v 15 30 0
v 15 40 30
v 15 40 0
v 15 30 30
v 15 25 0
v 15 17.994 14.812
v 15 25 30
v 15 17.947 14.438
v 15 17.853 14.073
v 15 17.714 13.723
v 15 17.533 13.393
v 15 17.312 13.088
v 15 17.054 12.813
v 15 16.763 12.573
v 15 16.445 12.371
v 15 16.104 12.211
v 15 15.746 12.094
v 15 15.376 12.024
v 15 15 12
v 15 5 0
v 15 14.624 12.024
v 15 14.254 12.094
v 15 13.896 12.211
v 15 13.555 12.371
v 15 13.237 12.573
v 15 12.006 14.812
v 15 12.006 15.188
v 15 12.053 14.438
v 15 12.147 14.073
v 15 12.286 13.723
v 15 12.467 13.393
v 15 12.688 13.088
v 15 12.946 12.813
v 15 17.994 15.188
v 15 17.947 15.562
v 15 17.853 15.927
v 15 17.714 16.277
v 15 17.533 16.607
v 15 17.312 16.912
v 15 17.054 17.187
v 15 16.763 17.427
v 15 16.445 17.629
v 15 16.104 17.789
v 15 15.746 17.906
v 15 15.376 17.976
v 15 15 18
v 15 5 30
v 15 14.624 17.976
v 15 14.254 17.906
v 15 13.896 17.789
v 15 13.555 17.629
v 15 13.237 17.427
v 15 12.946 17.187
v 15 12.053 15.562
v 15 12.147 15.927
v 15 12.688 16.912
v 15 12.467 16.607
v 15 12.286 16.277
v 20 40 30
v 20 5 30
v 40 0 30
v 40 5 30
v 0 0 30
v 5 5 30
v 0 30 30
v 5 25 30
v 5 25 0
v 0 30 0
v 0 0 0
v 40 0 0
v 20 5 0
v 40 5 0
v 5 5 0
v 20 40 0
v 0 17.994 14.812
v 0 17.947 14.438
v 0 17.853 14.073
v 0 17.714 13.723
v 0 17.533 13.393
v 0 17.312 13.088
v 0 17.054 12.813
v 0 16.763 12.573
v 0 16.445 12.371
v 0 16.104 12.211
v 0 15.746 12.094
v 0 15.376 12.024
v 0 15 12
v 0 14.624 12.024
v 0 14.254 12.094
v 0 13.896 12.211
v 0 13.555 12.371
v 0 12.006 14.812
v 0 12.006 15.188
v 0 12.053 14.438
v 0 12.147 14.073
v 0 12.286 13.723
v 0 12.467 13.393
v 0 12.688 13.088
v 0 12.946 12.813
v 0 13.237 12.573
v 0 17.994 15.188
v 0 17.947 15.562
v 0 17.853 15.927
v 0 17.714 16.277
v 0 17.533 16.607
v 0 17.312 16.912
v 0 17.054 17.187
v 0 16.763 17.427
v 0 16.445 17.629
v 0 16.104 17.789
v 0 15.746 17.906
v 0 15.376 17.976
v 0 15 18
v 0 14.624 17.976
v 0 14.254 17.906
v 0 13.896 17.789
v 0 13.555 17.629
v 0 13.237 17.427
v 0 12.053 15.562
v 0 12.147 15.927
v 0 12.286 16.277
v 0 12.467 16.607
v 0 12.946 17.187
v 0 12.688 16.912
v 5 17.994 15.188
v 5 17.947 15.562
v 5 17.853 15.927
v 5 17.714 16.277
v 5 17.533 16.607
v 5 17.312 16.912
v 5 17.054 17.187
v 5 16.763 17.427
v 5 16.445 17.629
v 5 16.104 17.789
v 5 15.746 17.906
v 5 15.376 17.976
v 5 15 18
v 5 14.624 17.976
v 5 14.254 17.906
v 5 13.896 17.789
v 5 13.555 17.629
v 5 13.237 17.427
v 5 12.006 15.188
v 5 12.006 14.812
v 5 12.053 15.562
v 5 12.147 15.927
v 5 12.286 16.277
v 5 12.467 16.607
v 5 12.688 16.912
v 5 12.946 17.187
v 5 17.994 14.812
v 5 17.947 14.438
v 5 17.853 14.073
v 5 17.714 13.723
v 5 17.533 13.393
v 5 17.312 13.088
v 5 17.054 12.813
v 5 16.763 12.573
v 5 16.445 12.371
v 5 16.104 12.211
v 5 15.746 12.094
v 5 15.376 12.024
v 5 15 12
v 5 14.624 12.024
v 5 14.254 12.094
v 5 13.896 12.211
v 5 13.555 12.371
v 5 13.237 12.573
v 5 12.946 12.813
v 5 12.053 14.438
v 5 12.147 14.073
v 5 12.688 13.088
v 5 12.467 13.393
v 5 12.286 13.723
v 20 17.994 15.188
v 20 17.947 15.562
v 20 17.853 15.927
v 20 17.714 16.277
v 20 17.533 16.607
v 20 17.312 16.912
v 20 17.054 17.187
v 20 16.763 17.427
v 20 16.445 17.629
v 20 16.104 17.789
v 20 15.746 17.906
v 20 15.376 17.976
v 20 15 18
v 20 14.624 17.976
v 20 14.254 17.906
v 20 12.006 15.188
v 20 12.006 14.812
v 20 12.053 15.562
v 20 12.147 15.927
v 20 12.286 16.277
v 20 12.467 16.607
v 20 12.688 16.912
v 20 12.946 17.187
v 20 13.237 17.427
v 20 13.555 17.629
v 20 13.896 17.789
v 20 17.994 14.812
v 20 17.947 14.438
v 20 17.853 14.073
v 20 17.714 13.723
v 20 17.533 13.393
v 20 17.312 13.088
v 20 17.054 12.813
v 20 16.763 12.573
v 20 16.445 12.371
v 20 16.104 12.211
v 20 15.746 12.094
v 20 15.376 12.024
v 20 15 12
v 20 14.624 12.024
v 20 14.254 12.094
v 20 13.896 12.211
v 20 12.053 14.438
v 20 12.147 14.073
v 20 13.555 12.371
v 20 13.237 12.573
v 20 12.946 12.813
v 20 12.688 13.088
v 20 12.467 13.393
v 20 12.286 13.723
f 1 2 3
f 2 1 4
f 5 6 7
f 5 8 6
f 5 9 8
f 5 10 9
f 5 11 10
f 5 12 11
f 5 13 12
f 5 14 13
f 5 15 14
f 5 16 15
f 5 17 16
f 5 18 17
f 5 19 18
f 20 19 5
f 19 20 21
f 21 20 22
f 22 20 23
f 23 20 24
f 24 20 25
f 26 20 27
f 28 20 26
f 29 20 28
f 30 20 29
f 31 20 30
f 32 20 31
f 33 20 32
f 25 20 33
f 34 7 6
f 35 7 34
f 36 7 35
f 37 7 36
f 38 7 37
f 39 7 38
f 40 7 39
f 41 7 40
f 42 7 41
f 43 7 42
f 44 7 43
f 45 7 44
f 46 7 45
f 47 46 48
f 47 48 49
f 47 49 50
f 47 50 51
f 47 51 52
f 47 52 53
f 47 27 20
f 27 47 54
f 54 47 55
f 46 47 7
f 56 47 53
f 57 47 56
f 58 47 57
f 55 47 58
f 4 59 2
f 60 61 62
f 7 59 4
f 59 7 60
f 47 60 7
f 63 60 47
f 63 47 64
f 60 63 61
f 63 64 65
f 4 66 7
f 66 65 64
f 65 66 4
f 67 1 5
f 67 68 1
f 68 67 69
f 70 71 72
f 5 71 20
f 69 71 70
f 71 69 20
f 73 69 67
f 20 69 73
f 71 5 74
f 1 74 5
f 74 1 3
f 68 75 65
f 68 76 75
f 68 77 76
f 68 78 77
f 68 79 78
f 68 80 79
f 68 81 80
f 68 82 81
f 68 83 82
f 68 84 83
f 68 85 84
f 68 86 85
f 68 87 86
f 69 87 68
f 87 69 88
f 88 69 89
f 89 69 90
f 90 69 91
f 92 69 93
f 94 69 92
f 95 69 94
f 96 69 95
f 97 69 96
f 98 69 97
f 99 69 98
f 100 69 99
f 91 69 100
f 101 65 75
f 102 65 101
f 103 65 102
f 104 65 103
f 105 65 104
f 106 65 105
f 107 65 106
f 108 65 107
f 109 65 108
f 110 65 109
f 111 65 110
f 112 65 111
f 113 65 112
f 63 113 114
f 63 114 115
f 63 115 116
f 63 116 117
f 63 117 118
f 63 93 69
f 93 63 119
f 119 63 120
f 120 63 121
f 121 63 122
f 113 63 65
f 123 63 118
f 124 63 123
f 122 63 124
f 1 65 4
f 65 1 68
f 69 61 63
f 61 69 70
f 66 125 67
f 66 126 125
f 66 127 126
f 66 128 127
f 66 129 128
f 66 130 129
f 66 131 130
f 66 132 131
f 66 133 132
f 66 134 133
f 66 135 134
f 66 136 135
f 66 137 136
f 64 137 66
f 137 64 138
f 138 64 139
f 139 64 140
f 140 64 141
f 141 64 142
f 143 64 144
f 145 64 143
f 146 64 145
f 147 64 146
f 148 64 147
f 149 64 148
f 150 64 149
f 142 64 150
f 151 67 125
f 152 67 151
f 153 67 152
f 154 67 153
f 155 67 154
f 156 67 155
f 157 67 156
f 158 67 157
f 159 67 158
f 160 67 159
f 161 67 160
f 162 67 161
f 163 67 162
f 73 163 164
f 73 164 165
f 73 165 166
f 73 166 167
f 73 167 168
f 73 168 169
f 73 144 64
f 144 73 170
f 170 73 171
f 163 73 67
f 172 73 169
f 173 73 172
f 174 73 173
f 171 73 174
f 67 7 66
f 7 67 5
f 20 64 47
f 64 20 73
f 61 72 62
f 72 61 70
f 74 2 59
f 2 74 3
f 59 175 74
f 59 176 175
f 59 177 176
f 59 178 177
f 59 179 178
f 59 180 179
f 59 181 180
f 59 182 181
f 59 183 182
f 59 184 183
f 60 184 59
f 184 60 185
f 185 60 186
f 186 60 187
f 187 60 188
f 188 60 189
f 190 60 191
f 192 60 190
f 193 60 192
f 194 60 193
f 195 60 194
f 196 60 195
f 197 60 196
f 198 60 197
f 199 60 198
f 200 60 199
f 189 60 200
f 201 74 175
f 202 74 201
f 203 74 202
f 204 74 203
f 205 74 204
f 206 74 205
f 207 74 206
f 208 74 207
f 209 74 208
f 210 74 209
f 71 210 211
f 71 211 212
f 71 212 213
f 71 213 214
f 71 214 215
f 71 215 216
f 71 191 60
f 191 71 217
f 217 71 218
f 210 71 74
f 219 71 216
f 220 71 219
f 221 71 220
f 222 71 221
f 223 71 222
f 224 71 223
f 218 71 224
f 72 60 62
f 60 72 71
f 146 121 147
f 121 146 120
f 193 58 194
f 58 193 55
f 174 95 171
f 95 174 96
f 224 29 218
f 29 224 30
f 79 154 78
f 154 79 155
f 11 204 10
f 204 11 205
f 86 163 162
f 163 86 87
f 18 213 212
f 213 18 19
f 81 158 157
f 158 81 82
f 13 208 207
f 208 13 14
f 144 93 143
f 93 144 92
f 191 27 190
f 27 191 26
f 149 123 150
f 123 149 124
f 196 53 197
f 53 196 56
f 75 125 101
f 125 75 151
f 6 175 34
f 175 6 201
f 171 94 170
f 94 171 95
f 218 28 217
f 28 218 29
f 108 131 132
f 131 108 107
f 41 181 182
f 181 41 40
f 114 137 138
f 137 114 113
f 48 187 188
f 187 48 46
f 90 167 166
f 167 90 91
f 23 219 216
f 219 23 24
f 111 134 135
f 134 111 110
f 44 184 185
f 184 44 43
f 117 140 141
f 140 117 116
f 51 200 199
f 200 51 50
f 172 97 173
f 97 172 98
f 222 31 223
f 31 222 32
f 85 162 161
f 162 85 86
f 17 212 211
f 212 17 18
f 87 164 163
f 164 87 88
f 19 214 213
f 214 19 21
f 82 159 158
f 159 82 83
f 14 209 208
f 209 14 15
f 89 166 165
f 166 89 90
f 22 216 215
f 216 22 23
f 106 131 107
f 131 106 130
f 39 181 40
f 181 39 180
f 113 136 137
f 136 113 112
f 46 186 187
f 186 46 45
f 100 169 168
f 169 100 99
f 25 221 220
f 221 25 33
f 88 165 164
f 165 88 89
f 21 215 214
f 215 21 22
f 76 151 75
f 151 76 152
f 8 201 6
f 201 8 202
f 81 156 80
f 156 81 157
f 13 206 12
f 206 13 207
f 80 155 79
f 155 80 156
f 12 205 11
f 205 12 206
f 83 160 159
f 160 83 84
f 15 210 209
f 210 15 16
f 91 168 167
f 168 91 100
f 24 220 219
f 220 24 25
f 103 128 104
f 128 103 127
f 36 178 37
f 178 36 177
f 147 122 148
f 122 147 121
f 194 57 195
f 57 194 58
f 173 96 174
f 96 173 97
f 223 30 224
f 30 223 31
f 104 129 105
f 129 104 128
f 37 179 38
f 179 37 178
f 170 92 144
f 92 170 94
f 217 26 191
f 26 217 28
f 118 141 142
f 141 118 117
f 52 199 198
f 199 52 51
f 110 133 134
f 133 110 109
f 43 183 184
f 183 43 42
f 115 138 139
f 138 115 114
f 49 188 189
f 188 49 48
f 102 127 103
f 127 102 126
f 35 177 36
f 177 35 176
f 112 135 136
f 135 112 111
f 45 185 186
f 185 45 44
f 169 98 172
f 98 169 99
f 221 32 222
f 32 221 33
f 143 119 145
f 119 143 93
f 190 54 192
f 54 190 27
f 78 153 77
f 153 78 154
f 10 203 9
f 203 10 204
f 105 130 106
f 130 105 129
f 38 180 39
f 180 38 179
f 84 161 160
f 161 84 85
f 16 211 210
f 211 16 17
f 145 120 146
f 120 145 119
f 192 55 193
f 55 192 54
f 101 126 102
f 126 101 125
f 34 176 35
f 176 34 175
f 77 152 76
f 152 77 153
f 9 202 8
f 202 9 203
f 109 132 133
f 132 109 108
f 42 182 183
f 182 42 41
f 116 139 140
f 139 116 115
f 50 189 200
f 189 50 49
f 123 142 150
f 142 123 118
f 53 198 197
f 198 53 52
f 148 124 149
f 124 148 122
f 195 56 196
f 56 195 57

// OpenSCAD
/*
 * file: wood-plug-molding.scad
 * author: gregor binder <gregor_reprap@catrix.at>
 * date: 28.12.2013
 * last change: 28.12.2013
 * license: CC BY-NC-SA 4.0
 */

hole_diameter=6;
thickness=5;
wood_thickness=20;
depth=30;
length1=40;
length2=20;
$fn=50;

/****************/

temp_thickness=wood_thickness+2*thickness;
temp_length=length2;

difference() {
	union() {
		difference() {
			cube([length2-thickness,temp_thickness,depth]);
			translate([thickness,thickness,-0.1])
			cube([length2-2*thickness+0.01,wood_thickness,depth+5]);
		}
		difference() {
			translate([length2-thickness,0,0])
				cube([temp_thickness-thickness,length1,depth]);
			translate([length2,thickness,-0.1])
				cube([wood_thickness+0.01,length1,depth+5]);
		}
	}
	translate([-0.1,temp_thickness/2,depth/2])
		rotate([0,90,0])
			cylinder(h=temp_length+5,r=hole_diameter/2);
}
